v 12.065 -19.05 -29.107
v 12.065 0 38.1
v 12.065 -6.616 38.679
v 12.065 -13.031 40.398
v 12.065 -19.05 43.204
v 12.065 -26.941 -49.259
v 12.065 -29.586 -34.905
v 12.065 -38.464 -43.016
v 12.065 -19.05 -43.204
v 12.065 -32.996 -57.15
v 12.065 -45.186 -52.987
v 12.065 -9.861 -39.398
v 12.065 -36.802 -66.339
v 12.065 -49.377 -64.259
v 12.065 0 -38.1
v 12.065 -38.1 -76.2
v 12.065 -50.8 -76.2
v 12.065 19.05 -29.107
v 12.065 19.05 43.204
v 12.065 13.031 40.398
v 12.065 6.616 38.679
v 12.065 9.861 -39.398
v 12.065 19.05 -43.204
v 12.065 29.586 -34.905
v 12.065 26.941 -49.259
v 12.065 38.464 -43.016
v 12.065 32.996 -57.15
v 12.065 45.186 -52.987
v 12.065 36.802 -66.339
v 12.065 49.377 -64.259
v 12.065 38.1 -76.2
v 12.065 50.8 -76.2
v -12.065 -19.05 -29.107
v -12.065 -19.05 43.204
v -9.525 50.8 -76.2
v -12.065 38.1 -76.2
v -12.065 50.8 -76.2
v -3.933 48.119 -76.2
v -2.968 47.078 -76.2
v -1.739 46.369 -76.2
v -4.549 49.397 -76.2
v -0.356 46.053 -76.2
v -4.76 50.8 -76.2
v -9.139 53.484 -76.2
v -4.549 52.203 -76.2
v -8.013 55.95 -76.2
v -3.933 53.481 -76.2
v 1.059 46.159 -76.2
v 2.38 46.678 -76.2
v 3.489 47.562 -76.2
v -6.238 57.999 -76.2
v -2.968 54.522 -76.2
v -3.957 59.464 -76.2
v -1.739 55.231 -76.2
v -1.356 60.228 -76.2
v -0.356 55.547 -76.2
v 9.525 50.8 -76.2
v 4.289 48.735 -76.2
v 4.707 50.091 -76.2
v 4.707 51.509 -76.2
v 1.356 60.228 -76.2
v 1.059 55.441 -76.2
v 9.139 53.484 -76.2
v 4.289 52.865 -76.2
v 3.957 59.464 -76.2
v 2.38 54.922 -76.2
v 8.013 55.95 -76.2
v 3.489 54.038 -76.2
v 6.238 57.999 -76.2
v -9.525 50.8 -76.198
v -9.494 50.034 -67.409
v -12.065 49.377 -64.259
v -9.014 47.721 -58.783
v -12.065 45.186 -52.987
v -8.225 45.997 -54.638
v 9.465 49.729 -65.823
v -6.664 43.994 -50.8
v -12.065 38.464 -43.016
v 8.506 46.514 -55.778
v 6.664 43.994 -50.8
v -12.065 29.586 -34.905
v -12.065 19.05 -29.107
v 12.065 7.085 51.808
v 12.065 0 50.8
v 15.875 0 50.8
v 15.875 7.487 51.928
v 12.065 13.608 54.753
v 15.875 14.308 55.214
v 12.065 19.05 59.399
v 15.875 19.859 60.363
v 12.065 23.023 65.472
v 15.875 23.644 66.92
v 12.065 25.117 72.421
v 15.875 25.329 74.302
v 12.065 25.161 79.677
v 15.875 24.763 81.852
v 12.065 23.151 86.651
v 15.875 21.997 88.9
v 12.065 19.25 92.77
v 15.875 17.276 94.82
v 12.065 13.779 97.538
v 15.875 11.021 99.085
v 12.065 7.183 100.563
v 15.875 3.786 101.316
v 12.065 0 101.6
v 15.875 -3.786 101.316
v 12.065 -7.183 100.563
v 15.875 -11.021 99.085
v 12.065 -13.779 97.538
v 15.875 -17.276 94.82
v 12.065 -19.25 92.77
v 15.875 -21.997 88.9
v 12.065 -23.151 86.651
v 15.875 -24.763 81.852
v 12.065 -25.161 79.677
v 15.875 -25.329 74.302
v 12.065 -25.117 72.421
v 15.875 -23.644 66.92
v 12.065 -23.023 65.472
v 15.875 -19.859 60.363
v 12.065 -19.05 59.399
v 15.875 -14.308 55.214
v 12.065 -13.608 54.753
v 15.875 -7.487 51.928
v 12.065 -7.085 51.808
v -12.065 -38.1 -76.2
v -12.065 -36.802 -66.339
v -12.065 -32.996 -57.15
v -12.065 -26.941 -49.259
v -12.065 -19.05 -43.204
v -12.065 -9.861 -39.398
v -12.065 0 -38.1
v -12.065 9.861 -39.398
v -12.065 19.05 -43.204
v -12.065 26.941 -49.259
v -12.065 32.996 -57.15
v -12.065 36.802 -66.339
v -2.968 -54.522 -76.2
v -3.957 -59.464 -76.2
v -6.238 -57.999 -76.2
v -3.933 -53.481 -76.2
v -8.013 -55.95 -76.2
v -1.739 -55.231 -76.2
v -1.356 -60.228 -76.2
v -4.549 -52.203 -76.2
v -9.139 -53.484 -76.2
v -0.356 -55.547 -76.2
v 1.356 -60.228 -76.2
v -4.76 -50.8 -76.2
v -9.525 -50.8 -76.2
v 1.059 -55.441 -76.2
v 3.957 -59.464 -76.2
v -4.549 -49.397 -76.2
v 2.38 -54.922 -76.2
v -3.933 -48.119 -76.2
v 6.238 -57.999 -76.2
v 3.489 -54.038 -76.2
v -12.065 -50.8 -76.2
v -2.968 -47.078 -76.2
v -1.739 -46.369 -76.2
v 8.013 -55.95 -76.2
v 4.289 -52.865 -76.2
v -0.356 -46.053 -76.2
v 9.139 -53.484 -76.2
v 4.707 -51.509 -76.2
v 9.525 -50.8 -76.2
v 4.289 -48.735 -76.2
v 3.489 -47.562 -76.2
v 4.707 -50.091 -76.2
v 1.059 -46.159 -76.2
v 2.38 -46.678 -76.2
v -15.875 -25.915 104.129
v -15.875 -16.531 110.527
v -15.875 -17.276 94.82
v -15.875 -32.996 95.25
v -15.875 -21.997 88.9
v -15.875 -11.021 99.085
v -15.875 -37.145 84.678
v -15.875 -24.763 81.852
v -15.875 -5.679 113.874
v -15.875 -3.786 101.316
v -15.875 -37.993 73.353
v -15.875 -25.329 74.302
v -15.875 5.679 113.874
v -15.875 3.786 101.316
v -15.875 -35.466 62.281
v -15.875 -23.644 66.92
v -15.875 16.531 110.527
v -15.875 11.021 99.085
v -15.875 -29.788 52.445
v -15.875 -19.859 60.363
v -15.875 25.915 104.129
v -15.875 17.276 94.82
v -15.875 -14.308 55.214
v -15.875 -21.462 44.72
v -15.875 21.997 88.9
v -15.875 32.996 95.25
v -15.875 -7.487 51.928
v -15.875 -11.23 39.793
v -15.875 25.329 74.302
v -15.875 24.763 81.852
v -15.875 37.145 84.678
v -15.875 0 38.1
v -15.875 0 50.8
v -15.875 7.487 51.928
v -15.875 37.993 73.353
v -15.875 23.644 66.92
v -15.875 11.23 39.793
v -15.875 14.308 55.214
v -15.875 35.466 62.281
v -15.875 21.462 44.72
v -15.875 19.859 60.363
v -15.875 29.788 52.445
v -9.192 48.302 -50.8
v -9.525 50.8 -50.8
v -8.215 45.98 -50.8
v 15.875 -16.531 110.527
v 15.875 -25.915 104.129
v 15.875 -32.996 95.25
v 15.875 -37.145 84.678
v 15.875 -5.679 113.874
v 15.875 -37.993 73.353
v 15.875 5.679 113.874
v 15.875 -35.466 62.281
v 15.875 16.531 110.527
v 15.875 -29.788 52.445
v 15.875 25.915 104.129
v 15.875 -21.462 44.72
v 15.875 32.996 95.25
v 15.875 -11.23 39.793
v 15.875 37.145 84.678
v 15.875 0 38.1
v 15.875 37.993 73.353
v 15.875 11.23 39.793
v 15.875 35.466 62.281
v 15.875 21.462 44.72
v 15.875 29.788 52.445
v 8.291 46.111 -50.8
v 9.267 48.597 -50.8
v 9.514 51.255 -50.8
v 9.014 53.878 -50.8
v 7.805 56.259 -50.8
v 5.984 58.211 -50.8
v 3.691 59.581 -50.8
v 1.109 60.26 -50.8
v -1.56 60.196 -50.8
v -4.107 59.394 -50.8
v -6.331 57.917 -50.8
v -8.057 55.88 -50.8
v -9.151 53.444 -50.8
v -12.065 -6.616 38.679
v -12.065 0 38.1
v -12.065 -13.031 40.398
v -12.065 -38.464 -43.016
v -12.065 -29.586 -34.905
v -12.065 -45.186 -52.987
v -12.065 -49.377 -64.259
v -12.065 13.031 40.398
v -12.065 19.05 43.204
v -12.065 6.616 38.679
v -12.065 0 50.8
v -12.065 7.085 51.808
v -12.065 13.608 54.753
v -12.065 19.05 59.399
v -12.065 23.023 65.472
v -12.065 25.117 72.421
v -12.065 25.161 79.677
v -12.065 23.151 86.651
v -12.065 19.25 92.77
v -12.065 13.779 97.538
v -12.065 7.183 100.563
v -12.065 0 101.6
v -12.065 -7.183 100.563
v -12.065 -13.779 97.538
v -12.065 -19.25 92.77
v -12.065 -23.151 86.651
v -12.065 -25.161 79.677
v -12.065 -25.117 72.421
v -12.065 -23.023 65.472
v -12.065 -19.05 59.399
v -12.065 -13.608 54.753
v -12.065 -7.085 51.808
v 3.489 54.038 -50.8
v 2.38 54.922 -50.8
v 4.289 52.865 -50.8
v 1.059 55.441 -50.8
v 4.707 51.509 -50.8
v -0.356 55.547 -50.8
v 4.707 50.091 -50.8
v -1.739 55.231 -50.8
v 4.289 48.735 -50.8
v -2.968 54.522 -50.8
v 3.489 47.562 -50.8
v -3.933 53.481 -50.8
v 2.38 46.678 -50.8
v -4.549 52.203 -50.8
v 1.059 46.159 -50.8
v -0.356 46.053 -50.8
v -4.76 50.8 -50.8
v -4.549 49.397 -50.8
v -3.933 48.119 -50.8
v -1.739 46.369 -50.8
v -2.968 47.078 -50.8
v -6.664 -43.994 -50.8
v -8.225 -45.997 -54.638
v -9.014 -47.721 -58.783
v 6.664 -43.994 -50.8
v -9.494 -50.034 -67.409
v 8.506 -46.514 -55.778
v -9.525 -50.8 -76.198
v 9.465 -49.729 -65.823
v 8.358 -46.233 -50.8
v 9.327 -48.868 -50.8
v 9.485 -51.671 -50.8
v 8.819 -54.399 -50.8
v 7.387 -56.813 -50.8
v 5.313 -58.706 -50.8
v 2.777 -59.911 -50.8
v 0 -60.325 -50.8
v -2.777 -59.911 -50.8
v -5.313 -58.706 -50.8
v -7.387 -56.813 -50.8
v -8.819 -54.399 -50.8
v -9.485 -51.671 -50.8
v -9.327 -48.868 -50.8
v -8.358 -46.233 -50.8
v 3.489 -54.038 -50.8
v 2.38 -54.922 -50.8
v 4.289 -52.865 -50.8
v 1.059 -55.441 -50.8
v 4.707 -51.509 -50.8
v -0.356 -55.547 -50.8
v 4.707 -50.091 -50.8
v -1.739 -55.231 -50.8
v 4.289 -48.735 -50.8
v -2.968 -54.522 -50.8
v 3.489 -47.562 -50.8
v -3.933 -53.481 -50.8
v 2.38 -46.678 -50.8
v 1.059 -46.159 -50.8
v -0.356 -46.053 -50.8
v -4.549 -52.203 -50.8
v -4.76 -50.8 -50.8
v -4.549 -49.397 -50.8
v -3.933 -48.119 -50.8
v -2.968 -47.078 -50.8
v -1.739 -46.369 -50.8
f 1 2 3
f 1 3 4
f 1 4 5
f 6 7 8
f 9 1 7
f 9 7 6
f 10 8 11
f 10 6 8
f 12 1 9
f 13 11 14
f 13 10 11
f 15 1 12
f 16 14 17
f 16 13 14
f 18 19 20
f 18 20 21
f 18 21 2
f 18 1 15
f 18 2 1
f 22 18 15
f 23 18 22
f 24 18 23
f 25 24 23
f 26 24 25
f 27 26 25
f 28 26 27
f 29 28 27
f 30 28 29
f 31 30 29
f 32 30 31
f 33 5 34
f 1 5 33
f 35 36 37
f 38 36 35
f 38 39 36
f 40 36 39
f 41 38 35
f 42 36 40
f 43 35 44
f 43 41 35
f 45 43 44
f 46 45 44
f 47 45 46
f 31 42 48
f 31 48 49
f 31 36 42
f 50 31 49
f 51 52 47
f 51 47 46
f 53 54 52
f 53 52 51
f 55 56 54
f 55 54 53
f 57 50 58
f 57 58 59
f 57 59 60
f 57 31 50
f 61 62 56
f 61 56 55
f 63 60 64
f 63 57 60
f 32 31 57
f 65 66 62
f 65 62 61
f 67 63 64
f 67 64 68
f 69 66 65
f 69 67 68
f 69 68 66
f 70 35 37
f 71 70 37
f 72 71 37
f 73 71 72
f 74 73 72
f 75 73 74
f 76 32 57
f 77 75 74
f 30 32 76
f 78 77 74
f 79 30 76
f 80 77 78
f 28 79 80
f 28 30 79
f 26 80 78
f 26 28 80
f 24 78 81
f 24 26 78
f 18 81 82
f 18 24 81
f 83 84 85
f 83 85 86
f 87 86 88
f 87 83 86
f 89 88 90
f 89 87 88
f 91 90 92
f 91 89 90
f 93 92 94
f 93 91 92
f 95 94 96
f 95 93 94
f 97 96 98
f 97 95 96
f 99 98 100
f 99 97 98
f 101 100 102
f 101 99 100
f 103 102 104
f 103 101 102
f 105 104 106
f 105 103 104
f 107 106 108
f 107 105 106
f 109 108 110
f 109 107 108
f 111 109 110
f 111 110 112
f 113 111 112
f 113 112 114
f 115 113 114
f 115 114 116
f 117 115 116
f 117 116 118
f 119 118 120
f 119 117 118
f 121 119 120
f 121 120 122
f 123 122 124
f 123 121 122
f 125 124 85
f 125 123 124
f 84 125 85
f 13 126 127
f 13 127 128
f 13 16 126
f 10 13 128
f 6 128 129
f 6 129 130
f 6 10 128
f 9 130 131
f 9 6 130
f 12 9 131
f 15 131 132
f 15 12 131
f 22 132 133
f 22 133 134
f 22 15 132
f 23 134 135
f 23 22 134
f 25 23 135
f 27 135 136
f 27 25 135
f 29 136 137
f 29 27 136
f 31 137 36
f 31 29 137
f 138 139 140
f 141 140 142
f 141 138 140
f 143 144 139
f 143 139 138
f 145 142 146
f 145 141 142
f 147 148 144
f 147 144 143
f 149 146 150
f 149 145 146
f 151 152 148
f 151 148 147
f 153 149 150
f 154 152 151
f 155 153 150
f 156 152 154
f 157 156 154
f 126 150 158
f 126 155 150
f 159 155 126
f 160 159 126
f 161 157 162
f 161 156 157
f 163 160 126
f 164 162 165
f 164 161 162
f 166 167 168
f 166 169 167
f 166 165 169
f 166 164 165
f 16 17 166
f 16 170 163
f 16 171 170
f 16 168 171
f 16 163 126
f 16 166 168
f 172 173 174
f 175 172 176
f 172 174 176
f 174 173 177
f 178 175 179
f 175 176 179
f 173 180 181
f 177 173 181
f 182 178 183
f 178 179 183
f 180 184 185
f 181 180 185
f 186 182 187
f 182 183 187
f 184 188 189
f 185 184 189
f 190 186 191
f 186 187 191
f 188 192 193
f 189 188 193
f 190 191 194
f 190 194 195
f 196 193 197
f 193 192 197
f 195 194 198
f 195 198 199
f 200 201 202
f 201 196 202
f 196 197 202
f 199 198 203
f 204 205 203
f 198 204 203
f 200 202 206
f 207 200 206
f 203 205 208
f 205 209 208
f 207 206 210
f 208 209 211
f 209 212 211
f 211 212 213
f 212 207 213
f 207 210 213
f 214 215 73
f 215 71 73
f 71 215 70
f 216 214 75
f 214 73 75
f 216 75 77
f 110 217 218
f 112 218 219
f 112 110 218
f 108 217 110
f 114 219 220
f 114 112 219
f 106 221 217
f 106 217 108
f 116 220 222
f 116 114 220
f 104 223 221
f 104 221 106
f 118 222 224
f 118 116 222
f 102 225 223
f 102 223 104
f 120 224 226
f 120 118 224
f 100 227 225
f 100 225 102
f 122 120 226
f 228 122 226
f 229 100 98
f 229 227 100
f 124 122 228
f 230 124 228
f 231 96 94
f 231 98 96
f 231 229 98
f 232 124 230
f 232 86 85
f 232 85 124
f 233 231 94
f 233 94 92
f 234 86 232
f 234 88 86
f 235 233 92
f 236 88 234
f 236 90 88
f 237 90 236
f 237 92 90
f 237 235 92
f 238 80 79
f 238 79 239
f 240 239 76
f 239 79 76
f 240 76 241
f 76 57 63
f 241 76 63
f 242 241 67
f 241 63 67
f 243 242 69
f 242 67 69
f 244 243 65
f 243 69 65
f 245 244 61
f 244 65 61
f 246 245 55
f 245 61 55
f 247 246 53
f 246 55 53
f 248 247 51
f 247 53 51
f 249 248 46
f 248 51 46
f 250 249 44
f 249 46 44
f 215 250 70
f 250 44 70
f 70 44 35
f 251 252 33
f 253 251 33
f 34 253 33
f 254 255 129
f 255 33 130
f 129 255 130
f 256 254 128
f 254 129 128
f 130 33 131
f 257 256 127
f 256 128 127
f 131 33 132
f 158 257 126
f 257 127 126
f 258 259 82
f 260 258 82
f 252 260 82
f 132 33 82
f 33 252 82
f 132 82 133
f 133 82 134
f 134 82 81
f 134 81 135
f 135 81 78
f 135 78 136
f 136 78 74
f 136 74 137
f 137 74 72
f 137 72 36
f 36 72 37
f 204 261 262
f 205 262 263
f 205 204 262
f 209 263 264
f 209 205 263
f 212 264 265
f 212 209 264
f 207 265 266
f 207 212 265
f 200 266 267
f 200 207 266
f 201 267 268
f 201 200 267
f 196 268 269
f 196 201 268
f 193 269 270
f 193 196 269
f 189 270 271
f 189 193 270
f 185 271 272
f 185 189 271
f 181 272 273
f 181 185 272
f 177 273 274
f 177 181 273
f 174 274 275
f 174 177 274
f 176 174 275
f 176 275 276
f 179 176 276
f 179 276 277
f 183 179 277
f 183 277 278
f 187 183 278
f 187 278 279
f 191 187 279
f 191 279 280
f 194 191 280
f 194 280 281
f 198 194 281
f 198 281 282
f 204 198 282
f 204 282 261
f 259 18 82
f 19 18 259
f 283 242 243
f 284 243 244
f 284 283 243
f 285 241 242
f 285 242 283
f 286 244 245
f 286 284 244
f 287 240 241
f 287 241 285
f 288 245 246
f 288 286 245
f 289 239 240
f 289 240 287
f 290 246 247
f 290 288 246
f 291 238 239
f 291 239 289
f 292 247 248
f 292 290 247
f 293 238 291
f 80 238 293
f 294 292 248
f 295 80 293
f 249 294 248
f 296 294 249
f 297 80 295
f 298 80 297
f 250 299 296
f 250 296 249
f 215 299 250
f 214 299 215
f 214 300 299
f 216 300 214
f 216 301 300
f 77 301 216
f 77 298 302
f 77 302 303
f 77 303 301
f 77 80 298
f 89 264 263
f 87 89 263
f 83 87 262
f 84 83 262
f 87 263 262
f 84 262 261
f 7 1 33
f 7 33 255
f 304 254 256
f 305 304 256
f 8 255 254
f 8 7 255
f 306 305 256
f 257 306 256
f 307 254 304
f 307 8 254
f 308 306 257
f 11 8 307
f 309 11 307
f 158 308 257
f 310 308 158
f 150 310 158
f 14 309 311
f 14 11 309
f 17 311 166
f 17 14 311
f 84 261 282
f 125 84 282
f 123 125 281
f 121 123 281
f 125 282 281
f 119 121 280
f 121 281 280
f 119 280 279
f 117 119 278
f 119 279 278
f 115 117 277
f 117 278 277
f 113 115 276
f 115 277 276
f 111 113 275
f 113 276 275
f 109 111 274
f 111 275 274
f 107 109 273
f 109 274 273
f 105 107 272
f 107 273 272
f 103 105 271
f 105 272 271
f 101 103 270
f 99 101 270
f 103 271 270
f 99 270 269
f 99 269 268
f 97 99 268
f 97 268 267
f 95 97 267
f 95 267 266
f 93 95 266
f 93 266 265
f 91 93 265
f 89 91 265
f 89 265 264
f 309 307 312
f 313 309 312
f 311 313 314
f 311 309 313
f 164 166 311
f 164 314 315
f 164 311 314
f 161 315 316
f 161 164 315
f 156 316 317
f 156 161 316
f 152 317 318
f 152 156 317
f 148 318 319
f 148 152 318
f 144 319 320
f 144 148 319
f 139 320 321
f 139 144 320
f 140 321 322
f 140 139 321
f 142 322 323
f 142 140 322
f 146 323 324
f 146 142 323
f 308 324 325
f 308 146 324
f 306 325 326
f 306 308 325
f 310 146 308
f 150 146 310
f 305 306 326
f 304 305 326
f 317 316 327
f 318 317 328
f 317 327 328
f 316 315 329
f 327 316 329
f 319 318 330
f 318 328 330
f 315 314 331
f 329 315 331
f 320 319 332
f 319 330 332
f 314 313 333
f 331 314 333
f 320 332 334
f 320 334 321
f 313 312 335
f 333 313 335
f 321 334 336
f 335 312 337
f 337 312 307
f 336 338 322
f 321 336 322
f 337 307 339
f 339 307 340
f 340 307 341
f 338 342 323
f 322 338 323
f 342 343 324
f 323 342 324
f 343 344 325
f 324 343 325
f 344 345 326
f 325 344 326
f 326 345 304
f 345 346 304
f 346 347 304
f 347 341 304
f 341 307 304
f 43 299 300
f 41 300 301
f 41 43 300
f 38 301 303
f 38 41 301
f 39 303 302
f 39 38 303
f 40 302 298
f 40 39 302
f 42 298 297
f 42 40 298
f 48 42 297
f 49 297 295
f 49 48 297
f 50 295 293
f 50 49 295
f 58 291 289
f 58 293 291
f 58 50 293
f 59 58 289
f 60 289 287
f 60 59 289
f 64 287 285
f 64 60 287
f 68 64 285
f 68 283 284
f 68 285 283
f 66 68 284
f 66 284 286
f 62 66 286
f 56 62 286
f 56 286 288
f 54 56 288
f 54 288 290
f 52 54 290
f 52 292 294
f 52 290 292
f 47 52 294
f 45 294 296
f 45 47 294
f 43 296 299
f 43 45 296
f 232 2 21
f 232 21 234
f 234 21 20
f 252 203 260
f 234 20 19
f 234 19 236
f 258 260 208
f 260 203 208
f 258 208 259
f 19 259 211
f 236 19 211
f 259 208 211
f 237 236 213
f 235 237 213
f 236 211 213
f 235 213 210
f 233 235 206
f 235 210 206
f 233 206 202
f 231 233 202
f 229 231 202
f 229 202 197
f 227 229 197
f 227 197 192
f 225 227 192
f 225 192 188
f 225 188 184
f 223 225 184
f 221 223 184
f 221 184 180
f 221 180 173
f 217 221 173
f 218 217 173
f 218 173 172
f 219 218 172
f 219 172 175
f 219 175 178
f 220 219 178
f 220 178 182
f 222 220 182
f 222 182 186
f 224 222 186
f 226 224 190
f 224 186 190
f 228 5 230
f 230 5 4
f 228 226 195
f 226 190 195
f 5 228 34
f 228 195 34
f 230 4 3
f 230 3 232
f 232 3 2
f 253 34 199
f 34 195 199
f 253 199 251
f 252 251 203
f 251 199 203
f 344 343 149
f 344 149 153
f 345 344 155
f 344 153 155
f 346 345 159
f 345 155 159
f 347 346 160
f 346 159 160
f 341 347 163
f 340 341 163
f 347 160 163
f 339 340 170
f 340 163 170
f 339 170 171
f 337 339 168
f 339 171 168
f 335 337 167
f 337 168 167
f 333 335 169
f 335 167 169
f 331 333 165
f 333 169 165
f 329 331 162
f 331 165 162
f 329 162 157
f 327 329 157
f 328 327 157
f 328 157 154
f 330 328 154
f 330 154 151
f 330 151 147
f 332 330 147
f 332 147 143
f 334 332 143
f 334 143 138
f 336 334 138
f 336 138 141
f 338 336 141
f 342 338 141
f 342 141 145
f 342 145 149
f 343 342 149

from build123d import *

# Parameters (mm, degrees)
SKETCH1_R           = 25.4
BOSS_EXTRUDE2_DEPTH = 12.065
SKETCH1_6_R         = 38.1
SKETCH1_6_R_2       = 25.4
BOSS_EXTRUDE3_DEPTH = 15.875
SKETCH3_R           = 9.525
BOSS_EXTRUDE4_DEPTH = 25.4
SKETCH5_R           = 4.76
CUT_EXTRUDE1_DEPTH  = 32.4


with BuildPart() as part:
    # Sketch1 → Boss-Extrude2 (new, symmetric)
    with BuildSketch(Plane(origin=(0, 0, 0), x_dir=(0, 0, -1), z_dir=(1, 0, 0))):
        with BuildLine():
            ThreePointArc((76.2, -38.1), (38.1, 0), (76.2, 38.1))
            Line((76.2, 38.1), (76.2, 50.8))
            ThreePointArc((76.2, 50.8), (47.801936686, 42.121134838), (29.107139607, 19.05))
            Line((29.107139607, 19.05), (-43.204432116, 19.05))
            ThreePointArc((-43.204432116, 19.05), (-114.3, 0), (-43.204432116, -19.05))
            Line((-43.204432116, -19.05), (29.107139607, -19.05))
            ThreePointArc((29.107139607, -19.05), (47.801936686, -42.121134838), (76.2, -50.8))
            Line((76.2, -50.8), (76.2, -38.1))
        make_face()
        with Locations((-76.2, 0)):
            Circle(SKETCH1_R, mode=Mode.SUBTRACT)
    extrude(amount=BOSS_EXTRUDE2_DEPTH, both=True)

    # Sketch1<6> → Boss-Extrude3 (add, symmetric)
    with BuildSketch(Plane(origin=(0, 0, 0), x_dir=(0, 0, -1), z_dir=(1, 0, 0))):
        with Locations((-76.2, 0)):
            Circle(SKETCH1_6_R)
        with Locations((-76.2, 0)):
            Circle(SKETCH1_6_R_2, mode=Mode.SUBTRACT)
    extrude(amount=BOSS_EXTRUDE3_DEPTH, both=True)

    # Sketch3 → Boss-Extrude4 (add)
    with BuildSketch(Plane(origin=(0, 0, -76.2), x_dir=(-1, 0, 0), z_dir=(0, 0, -1))):
        with Locations((0, -50.8)):
            Circle(SKETCH3_R)
    boss_extrude4 = extrude(amount=-BOSS_EXTRUDE4_DEPTH)

    # Sketch5 → Cut-Extrude1 (cut)
    with BuildSketch(Plane(origin=(0, 0, -76.2), x_dir=(-1, 0, 0), z_dir=(0, 0, -1))):
        with Locations((0, -50.8)):
            Circle(SKETCH5_R)
    cut_extrude1 = extrude(amount=-CUT_EXTRUDE1_DEPTH, mode=Mode.SUBTRACT)

    # Mirror2: Boss-Extrude4, Cut-Extrude1 across plane
    add(boss_extrude4.mirror(Plane.ZX))
    add(cut_extrude1.mirror(Plane.ZX), mode=Mode.SUBTRACT)


solid = part.part
